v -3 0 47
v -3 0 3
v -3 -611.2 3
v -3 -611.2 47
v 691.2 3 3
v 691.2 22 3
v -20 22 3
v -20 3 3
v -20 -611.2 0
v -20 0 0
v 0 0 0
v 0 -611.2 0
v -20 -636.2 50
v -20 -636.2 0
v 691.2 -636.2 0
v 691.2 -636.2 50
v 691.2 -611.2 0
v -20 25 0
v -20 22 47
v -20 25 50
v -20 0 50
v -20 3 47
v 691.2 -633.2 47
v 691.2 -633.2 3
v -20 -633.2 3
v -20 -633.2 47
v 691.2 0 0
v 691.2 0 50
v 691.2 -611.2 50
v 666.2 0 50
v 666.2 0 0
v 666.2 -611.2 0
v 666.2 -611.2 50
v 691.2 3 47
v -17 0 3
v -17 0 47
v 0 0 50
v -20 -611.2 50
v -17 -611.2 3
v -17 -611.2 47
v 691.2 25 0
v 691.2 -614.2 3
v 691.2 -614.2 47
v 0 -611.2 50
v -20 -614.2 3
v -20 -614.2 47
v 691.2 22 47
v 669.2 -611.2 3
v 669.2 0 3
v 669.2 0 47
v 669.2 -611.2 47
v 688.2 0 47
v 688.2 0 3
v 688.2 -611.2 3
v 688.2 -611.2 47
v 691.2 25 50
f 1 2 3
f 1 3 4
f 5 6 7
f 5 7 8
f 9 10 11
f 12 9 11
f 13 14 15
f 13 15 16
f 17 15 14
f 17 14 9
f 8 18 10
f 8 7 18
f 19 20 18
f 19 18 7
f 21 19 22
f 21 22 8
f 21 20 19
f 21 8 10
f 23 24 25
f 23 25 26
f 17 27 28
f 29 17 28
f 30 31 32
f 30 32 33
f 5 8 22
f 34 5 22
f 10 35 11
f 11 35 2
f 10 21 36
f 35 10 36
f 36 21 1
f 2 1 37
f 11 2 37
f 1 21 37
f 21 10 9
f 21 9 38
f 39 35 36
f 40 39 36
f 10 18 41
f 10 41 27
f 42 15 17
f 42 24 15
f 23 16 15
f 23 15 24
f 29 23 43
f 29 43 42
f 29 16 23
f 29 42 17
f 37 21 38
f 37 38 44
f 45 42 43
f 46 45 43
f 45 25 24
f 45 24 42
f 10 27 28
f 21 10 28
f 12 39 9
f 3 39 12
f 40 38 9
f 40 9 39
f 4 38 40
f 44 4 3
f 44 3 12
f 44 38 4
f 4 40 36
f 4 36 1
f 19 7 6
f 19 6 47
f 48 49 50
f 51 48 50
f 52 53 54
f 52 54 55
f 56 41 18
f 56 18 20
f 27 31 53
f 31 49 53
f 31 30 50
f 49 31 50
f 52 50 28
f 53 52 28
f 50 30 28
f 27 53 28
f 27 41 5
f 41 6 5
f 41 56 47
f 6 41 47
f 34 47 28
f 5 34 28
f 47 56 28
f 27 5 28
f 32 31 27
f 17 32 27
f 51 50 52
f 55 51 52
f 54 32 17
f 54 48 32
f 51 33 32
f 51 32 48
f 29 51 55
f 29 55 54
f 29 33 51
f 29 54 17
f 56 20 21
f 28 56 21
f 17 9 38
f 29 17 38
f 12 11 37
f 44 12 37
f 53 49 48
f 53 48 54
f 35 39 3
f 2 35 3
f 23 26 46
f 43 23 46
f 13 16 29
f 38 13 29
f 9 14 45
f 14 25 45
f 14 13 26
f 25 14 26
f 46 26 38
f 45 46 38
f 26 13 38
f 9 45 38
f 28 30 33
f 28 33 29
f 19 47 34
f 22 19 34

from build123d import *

# Parameters (mm, degrees)
F0_W     = 20
F0_H     = 50
F0_W_2   = 14
F0_H_2   = 44
F1_DEPTH = 611.2
F3_W     = 25
F3_H     = 50
F3_W_2   = 19
F3_H_2   = 44
F4_DEPTH = 711.2
F5_W     = 25
F5_H     = 50
F5_W_2   = 19
F5_H_2   = 44
F6_DEPTH = 611.2
F7_W     = 25
F7_H     = 50
F7_W_2   = 19
F7_H_2   = 44
F8_DEPTH = 711.2


with BuildPart() as f1:
    # F0 (on Front) → F1 (new body)
    with BuildSketch(Plane.XZ):
        with Locations((-10, 25)):
            Rectangle(F0_W, F0_H)
        with Locations((-10, 25)):
            Rectangle(F0_W_2, F0_H_2, mode=Mode.SUBTRACT)
    extrude(amount=F1_DEPTH)


with BuildPart() as f2_1:
    # F2: copy of F1
    add(f1.part)


with BuildPart() as f4:
    # F3 (on face) → F4 (new body)
    with BuildSketch(Plane(origin=(-20, 0, 0), x_dir=(0, -1, 0), z_dir=(-1, 0, 0))):
        with Locations((-12.5, 25)):
            Rectangle(F3_W, F3_H)
        with Locations((-12.5, 25)):
            Rectangle(F3_W_2, F3_H_2, mode=Mode.SUBTRACT)
    extrude(amount=-F4_DEPTH)


with BuildPart() as f6:
    # F5 (on face) → F6 (new body)
    with BuildSketch(Plane.XZ):
        with Locations((678.7, 25)):
            Rectangle(F5_W, F5_H)
        with Locations((678.7, 25)):
            Rectangle(F5_W_2, F5_H_2, mode=Mode.SUBTRACT)
    extrude(amount=F6_DEPTH)


with BuildPart() as f8:
    # F7 (on face) → F8 (new body)
    with BuildSketch(Plane.YZ.offset(691.2)):
        with Locations((-623.7, 25)):
            Rectangle(F7_W, F7_H)
        with Locations((-623.7, 25)):
            Rectangle(F7_W_2, F7_H_2, mode=Mode.SUBTRACT)
    extrude(amount=-F8_DEPTH)


solid = Compound([f1.part, f4.part, f6.part, f8.part])
